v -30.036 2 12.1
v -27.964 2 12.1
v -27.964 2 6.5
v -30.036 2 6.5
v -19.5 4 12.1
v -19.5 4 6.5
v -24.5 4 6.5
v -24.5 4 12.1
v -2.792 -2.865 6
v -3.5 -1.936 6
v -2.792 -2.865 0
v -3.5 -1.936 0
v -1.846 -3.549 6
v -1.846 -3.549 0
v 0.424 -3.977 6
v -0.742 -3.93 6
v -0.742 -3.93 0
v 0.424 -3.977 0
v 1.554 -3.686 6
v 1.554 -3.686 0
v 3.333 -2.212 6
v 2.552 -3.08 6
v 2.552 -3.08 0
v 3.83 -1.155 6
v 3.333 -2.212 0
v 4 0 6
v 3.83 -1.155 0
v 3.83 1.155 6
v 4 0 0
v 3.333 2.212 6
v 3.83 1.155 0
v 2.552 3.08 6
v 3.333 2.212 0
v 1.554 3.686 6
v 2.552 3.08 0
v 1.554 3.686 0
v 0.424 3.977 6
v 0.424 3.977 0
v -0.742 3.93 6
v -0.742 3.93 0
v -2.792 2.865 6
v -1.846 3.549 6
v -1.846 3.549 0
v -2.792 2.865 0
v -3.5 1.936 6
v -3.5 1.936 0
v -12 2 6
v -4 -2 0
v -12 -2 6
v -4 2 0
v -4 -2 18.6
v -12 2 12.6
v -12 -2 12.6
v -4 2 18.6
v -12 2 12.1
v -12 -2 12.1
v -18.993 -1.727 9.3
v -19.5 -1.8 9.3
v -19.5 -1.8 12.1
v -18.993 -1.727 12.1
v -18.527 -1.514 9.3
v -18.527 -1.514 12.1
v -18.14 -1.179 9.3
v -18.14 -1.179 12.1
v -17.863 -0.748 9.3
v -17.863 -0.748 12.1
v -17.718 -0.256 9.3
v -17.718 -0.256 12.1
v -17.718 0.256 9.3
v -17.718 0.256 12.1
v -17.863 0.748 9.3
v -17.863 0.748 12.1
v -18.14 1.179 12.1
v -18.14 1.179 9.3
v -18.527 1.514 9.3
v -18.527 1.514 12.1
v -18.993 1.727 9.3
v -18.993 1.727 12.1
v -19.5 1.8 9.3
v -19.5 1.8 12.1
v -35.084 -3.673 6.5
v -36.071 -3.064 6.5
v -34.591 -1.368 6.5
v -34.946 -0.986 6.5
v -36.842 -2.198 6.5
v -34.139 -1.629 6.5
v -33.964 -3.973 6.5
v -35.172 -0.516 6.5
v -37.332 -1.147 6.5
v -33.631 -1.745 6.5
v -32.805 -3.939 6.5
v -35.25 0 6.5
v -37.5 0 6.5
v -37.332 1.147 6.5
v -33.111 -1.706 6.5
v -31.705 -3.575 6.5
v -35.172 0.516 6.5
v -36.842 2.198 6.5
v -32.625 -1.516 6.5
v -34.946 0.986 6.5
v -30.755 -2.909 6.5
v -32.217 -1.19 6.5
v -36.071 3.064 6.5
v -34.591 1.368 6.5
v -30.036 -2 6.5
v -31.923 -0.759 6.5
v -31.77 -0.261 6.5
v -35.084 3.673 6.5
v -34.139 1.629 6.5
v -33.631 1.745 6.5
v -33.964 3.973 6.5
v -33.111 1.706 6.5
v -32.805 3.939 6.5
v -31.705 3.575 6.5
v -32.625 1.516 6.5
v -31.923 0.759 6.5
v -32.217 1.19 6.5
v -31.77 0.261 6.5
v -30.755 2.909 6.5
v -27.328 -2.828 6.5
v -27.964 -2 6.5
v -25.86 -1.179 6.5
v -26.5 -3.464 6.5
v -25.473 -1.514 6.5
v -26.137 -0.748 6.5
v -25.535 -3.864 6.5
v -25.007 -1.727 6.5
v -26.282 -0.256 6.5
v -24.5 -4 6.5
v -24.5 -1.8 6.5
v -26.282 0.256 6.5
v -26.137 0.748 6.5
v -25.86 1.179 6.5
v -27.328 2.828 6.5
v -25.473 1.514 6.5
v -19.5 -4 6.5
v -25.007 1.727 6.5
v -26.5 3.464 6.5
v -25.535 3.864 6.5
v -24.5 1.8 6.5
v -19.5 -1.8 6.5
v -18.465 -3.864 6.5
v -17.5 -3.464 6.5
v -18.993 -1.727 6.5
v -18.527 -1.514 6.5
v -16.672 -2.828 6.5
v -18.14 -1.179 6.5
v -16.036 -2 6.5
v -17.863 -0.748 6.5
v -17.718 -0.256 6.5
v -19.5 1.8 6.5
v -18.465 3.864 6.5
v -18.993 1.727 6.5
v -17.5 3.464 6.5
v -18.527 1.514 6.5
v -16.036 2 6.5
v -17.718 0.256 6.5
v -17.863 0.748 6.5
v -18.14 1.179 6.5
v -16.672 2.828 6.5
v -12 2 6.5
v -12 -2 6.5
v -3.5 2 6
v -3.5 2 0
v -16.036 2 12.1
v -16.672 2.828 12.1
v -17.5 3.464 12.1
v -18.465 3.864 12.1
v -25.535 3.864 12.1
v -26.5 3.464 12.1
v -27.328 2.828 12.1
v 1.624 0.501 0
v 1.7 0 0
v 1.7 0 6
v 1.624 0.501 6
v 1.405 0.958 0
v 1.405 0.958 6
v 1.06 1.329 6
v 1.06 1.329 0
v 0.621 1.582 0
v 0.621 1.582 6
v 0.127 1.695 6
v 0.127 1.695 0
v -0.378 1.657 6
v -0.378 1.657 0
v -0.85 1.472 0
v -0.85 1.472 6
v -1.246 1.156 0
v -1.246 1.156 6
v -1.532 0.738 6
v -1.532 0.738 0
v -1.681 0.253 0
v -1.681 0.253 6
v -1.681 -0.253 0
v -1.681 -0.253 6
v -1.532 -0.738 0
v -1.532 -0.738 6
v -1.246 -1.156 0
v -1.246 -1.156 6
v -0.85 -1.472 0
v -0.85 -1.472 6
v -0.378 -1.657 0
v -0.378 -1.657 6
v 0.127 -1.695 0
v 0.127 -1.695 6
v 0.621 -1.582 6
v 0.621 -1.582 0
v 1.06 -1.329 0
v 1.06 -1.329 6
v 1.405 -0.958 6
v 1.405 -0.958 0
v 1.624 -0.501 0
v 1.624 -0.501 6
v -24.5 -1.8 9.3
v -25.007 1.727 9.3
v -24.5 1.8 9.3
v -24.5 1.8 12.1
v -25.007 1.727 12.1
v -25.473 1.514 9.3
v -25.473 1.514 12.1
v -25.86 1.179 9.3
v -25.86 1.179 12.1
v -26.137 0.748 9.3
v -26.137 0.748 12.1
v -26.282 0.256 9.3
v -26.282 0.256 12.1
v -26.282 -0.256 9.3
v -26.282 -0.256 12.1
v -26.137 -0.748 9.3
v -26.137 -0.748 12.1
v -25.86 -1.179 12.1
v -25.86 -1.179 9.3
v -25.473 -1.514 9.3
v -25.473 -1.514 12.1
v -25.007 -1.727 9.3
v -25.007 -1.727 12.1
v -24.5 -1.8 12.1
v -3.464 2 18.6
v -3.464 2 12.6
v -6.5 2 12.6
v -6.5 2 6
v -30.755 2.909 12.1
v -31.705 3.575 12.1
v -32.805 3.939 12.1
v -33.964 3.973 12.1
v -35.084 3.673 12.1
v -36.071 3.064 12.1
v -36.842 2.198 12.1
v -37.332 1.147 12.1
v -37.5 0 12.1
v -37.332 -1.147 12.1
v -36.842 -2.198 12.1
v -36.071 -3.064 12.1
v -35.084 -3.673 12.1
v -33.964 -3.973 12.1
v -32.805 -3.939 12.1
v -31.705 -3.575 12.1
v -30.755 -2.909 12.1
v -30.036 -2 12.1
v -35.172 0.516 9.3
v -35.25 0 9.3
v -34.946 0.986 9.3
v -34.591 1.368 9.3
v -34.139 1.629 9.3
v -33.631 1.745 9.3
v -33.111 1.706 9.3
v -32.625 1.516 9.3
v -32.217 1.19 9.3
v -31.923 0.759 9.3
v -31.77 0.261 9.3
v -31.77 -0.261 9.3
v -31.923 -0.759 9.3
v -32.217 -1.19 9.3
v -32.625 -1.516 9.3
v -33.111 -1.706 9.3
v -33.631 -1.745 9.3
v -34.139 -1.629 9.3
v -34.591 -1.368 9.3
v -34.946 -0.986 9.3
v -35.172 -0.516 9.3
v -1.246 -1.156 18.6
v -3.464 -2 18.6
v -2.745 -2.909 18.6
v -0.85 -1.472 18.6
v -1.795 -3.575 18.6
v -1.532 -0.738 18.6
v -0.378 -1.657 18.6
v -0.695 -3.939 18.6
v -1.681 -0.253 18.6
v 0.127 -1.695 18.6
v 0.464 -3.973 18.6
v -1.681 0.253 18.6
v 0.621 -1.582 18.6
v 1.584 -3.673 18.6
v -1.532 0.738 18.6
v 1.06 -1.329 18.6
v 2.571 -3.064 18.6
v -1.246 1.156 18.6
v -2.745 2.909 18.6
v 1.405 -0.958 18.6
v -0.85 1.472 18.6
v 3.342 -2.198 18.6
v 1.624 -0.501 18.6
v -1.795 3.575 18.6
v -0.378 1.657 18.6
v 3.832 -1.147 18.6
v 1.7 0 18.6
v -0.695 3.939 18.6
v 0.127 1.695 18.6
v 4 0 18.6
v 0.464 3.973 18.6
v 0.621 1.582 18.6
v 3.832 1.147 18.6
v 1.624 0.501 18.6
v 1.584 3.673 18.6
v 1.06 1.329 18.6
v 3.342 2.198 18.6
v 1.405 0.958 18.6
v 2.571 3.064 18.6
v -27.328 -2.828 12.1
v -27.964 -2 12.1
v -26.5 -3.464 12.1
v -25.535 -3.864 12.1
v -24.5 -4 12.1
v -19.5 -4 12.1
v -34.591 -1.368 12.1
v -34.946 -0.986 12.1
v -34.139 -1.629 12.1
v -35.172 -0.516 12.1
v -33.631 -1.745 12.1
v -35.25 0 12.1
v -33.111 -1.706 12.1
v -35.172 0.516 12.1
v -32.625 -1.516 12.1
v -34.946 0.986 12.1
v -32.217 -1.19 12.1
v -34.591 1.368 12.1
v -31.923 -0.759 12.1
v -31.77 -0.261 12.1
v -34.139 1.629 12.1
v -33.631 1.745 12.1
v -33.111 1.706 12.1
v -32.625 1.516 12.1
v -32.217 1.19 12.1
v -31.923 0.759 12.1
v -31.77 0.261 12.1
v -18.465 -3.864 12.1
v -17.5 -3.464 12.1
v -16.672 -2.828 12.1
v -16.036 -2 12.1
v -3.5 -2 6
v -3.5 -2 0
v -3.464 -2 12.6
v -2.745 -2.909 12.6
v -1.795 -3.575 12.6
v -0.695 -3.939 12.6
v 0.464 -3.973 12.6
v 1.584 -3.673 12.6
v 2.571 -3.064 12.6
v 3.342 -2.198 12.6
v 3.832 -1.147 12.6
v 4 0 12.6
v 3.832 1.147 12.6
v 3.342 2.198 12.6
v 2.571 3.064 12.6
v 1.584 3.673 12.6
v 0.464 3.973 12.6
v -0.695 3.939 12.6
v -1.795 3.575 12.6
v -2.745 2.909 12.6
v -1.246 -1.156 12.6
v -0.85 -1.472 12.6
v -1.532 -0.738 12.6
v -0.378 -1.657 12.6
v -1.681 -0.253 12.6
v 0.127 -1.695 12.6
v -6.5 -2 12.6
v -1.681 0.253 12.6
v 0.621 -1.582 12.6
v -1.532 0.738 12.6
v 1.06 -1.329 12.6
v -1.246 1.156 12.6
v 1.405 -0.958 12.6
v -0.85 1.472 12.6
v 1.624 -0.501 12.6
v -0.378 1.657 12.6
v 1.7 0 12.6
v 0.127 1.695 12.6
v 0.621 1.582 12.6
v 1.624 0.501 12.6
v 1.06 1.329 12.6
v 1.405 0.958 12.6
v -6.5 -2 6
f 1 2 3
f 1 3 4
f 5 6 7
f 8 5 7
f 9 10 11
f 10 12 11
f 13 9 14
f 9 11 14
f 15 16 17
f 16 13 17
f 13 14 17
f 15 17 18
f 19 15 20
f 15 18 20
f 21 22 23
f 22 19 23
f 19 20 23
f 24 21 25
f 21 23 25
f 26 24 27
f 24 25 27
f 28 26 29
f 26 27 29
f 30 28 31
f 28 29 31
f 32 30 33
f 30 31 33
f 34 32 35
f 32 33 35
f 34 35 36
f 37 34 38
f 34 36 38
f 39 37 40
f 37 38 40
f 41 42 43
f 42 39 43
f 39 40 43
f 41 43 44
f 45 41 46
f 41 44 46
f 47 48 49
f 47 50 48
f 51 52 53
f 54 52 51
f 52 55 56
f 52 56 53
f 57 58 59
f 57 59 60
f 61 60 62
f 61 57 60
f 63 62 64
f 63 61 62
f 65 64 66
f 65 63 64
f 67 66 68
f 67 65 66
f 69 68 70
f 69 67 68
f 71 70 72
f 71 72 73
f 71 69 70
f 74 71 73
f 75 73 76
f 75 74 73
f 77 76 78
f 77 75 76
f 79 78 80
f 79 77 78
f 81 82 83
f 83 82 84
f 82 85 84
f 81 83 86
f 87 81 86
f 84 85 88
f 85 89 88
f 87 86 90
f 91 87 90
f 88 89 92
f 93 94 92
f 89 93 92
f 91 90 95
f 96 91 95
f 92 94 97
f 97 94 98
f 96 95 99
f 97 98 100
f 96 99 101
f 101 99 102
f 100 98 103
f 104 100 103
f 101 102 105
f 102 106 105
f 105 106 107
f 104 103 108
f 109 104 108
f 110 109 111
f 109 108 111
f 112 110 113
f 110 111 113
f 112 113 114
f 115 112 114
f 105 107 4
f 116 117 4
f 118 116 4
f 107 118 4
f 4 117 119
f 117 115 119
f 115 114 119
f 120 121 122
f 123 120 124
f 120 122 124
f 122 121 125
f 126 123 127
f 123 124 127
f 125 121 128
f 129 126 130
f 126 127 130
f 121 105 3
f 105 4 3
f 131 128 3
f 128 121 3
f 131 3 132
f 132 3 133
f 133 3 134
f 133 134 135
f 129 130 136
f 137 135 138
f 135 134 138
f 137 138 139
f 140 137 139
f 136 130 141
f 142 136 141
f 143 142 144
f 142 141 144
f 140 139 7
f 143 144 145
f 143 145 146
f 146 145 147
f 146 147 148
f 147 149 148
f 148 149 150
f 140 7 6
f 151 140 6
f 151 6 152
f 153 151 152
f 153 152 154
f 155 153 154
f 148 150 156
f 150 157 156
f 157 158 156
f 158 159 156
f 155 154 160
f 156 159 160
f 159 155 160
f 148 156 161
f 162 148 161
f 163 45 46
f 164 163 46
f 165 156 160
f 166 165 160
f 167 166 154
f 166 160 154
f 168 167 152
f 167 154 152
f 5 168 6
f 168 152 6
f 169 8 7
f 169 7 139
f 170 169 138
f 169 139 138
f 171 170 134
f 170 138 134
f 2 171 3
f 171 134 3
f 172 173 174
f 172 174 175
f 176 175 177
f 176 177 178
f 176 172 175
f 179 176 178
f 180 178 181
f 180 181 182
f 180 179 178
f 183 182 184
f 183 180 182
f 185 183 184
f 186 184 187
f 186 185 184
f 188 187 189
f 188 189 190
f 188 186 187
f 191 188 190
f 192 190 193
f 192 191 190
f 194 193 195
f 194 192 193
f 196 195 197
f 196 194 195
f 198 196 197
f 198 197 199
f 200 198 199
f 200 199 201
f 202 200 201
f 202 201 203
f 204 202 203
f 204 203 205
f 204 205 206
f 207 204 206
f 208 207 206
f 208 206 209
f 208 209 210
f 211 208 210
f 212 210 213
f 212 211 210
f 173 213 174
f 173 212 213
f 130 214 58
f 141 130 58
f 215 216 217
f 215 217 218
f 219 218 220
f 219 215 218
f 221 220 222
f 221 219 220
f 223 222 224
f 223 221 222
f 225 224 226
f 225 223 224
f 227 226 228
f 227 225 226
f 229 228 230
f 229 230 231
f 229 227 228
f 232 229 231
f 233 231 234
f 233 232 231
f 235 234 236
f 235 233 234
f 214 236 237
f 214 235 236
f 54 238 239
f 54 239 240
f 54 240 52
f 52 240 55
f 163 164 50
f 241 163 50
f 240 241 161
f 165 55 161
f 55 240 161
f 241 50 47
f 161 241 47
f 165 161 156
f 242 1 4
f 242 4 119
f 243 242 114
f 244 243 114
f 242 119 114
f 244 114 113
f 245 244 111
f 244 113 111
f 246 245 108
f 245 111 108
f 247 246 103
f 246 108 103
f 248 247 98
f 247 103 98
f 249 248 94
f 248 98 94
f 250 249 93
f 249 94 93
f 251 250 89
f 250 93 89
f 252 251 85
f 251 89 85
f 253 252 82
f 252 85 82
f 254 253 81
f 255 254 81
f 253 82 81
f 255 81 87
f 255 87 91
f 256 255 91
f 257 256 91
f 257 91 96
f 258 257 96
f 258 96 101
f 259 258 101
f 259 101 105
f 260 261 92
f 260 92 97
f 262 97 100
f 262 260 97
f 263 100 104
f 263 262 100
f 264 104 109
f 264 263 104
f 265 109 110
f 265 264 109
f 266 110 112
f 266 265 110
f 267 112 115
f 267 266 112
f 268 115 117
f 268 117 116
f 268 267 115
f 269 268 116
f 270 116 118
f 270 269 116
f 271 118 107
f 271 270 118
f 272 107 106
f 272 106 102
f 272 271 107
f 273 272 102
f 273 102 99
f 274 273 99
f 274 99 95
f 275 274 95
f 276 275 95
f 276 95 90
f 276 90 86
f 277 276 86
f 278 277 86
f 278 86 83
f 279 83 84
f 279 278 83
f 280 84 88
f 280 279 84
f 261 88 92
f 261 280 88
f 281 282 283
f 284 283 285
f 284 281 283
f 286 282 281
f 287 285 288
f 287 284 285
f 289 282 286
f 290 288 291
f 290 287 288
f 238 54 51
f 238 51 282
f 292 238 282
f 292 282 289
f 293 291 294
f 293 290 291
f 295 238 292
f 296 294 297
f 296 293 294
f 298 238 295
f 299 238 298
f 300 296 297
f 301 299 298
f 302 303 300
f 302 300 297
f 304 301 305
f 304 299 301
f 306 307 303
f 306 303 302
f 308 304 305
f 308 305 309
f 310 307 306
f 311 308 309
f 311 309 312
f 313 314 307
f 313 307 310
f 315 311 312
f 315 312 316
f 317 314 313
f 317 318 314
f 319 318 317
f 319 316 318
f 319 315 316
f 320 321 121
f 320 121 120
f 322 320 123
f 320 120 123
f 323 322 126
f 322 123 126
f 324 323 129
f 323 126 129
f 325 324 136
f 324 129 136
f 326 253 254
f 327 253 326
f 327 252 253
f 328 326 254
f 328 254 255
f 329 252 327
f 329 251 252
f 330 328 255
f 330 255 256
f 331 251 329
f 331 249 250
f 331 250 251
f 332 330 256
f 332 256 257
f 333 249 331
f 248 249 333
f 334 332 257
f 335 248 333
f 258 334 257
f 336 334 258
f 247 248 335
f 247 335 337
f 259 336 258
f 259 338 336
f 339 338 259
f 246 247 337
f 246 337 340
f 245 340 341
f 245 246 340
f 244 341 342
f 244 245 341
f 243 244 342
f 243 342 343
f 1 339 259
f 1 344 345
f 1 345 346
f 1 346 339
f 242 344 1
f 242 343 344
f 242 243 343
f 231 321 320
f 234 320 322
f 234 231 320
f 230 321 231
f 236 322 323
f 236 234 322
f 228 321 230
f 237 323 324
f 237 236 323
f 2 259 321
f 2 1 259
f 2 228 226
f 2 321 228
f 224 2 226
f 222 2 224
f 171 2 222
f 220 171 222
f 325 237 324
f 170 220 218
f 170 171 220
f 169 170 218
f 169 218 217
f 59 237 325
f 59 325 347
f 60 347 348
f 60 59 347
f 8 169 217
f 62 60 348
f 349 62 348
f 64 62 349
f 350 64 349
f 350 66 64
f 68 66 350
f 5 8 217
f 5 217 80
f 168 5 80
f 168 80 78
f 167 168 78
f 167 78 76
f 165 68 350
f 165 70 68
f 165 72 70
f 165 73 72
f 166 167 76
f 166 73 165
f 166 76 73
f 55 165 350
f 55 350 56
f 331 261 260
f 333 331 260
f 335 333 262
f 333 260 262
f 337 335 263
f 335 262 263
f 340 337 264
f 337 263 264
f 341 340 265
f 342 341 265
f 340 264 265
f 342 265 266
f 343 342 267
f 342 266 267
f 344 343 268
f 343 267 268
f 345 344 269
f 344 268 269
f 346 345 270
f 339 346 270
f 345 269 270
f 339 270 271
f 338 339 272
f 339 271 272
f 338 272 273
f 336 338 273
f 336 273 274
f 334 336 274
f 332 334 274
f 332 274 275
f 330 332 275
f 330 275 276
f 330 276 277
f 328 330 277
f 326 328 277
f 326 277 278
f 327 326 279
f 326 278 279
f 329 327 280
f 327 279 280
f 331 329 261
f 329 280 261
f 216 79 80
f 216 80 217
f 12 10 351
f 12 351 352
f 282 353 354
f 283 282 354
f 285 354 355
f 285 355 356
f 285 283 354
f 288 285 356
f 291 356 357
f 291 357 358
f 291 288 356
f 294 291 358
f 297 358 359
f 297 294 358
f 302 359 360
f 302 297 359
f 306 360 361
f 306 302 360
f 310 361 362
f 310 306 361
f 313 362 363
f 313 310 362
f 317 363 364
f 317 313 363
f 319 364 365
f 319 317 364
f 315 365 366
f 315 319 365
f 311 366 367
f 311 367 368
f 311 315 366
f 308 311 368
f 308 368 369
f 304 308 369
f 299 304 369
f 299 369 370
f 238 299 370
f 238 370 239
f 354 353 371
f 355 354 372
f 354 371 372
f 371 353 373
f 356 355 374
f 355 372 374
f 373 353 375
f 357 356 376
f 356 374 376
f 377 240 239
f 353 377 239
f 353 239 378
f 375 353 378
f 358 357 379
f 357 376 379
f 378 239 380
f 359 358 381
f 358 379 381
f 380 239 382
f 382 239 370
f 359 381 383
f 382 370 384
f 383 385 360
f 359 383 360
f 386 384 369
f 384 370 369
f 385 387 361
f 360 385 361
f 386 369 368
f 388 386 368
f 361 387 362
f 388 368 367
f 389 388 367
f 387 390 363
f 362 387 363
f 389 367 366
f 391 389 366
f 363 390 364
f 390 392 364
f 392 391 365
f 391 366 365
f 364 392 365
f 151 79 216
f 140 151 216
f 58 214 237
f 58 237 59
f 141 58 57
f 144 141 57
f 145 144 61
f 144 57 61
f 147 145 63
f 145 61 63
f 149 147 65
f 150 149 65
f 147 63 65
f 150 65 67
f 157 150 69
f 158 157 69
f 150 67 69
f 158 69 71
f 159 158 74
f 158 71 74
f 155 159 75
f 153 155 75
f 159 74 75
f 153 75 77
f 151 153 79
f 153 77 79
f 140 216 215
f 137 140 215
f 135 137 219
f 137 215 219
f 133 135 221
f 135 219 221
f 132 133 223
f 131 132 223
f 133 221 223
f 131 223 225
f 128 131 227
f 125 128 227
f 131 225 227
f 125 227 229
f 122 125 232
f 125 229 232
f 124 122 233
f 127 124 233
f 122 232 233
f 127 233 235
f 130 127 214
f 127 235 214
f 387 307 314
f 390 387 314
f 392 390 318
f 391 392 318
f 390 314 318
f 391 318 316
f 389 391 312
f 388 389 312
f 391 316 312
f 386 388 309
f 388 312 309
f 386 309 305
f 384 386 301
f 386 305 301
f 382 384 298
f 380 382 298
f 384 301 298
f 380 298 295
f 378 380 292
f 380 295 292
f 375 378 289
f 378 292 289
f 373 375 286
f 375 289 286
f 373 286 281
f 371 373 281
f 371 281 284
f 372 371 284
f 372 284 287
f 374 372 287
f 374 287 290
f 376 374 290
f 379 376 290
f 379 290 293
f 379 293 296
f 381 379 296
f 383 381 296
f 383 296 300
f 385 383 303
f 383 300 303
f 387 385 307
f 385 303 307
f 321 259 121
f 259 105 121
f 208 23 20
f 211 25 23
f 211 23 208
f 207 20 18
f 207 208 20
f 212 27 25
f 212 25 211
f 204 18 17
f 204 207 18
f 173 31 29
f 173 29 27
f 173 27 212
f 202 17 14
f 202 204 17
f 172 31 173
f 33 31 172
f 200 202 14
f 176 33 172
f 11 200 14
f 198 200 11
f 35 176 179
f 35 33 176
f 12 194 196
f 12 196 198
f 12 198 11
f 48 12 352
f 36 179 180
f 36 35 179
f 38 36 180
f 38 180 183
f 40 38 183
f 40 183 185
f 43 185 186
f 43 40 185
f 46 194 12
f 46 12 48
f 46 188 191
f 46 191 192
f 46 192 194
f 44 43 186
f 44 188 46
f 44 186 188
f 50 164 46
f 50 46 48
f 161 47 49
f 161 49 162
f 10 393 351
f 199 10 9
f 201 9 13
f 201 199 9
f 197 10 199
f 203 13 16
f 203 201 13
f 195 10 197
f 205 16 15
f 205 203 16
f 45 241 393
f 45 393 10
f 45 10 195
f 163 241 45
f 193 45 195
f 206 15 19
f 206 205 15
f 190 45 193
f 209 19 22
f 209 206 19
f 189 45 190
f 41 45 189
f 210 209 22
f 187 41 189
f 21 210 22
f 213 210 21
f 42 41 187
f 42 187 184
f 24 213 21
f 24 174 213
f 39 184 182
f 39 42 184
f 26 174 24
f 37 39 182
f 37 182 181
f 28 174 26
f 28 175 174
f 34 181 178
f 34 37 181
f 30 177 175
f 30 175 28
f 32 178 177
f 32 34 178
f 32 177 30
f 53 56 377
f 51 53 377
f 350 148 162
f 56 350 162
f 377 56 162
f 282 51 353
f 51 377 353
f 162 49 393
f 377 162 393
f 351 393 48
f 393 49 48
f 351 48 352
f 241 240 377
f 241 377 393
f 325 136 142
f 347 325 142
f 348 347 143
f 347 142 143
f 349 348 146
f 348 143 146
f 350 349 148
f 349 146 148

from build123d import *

# Parameters (mm, degrees)
SKETCH_1_R           = 4
SKETCH_1_R_2         = 1.7
EXTRUDE_1_DEPTH      = 6
EXTRUDE_2_DEPTH      = 2
EXTRUDE_2_DEPTH_BACK = 2
EXTRUDE_3_DEPTH      = 2.8
EXTRUDE_3_DEPTH_BACK = 2.8
SKETCH_3_R           = 1.75


with BuildPart() as part:
    # Эскиз1 → Бобышка-Вытянуть1 (new body)
    with BuildSketch(Plane.XY):
        Circle(SKETCH_1_R)
        Circle(SKETCH_1_R_2, mode=Mode.SUBTRACT)
    extrude_1 = extrude(amount=EXTRUDE_1_DEPTH)

    # Эскиз2 → Бобышка-Вытянуть2 (add, two sides: drawn at the far end of the back side and taken through both)
    with BuildSketch(Plane(origin=(0, 0, 0), x_dir=(1, 0, 0), z_dir=(0, 1, 0)).offset(-EXTRUDE_2_DEPTH_BACK)):
        Polygon((-4, 0), (-12, -6), (-12, -12.6), (-4, -18.6), (-3, -18.6), (-3, -12.6), (-4, -12.6), (-6.5, -12.6), (-6.5, -6), (-4, -6), (-3.5, -6), (-3.5, 0), align=None)
    extrude(amount=EXTRUDE_2_DEPTH + EXTRUDE_2_DEPTH_BACK)

    # Зеркальное отражение1: Бобышка-Вытянуть1 across plane
    add(extrude_1.mirror(Plane(origin=(0, 0, 9.3), x_dir=(1, 0, 0), z_dir=(0, 0, -1))))

    # Эскиз3 → Бобышка-Вытянуть3 (add, two sides: drawn at the far end of the back side and taken through both)
    with BuildSketch(Plane(origin=(0, 0, 9.3), x_dir=(-1, 0, 0), z_dir=(0, 0, -1)).offset(-EXTRUDE_3_DEPTH_BACK)):
        with BuildLine():
            Line((19.5, 4), (24.5, 4))
            ThreePointArc((24.5, 4), (26.5, 3.464101615), (27.964101615, 2))
            Line((27.964101615, 2), (30.035898385, 2))
            ThreePointArc((30.035898385, 2), (37.5, 0), (30.035898385, -2))
            Line((30.035898385, -2), (27.964101615, -2))
            ThreePointArc((27.964101615, -2), (26.5, -3.464101615), (24.5, -4))
            Line((24.5, -4), (19.5, -4))
            ThreePointArc((19.5, -4), (17.5, -3.464101615), (16.035898385, -2))
            Line((16.035898385, -2), (12, -2))
            Line((12, -2), (12, 2))
            Line((12, 2), (16.035898385, 2))
            ThreePointArc((16.035898385, 2), (17.5, 3.464101615), (19.5, 4))
        make_face()
        with Locations((33.5, 0)):
            Circle(SKETCH_3_R, mode=Mode.SUBTRACT)
        with BuildLine():
            Line((19.5, 1.8), (24.5, 1.8))
            ThreePointArc((24.5, 1.8), (26.3, 0), (24.5, -1.8))
            Line((24.5, -1.8), (19.5, -1.8))
            ThreePointArc((19.5, -1.8), (17.7, 0), (19.5, 1.8))
        make_face(mode=Mode.SUBTRACT)
    extrude(amount=EXTRUDE_3_DEPTH + EXTRUDE_3_DEPTH_BACK)


solid = part.part
